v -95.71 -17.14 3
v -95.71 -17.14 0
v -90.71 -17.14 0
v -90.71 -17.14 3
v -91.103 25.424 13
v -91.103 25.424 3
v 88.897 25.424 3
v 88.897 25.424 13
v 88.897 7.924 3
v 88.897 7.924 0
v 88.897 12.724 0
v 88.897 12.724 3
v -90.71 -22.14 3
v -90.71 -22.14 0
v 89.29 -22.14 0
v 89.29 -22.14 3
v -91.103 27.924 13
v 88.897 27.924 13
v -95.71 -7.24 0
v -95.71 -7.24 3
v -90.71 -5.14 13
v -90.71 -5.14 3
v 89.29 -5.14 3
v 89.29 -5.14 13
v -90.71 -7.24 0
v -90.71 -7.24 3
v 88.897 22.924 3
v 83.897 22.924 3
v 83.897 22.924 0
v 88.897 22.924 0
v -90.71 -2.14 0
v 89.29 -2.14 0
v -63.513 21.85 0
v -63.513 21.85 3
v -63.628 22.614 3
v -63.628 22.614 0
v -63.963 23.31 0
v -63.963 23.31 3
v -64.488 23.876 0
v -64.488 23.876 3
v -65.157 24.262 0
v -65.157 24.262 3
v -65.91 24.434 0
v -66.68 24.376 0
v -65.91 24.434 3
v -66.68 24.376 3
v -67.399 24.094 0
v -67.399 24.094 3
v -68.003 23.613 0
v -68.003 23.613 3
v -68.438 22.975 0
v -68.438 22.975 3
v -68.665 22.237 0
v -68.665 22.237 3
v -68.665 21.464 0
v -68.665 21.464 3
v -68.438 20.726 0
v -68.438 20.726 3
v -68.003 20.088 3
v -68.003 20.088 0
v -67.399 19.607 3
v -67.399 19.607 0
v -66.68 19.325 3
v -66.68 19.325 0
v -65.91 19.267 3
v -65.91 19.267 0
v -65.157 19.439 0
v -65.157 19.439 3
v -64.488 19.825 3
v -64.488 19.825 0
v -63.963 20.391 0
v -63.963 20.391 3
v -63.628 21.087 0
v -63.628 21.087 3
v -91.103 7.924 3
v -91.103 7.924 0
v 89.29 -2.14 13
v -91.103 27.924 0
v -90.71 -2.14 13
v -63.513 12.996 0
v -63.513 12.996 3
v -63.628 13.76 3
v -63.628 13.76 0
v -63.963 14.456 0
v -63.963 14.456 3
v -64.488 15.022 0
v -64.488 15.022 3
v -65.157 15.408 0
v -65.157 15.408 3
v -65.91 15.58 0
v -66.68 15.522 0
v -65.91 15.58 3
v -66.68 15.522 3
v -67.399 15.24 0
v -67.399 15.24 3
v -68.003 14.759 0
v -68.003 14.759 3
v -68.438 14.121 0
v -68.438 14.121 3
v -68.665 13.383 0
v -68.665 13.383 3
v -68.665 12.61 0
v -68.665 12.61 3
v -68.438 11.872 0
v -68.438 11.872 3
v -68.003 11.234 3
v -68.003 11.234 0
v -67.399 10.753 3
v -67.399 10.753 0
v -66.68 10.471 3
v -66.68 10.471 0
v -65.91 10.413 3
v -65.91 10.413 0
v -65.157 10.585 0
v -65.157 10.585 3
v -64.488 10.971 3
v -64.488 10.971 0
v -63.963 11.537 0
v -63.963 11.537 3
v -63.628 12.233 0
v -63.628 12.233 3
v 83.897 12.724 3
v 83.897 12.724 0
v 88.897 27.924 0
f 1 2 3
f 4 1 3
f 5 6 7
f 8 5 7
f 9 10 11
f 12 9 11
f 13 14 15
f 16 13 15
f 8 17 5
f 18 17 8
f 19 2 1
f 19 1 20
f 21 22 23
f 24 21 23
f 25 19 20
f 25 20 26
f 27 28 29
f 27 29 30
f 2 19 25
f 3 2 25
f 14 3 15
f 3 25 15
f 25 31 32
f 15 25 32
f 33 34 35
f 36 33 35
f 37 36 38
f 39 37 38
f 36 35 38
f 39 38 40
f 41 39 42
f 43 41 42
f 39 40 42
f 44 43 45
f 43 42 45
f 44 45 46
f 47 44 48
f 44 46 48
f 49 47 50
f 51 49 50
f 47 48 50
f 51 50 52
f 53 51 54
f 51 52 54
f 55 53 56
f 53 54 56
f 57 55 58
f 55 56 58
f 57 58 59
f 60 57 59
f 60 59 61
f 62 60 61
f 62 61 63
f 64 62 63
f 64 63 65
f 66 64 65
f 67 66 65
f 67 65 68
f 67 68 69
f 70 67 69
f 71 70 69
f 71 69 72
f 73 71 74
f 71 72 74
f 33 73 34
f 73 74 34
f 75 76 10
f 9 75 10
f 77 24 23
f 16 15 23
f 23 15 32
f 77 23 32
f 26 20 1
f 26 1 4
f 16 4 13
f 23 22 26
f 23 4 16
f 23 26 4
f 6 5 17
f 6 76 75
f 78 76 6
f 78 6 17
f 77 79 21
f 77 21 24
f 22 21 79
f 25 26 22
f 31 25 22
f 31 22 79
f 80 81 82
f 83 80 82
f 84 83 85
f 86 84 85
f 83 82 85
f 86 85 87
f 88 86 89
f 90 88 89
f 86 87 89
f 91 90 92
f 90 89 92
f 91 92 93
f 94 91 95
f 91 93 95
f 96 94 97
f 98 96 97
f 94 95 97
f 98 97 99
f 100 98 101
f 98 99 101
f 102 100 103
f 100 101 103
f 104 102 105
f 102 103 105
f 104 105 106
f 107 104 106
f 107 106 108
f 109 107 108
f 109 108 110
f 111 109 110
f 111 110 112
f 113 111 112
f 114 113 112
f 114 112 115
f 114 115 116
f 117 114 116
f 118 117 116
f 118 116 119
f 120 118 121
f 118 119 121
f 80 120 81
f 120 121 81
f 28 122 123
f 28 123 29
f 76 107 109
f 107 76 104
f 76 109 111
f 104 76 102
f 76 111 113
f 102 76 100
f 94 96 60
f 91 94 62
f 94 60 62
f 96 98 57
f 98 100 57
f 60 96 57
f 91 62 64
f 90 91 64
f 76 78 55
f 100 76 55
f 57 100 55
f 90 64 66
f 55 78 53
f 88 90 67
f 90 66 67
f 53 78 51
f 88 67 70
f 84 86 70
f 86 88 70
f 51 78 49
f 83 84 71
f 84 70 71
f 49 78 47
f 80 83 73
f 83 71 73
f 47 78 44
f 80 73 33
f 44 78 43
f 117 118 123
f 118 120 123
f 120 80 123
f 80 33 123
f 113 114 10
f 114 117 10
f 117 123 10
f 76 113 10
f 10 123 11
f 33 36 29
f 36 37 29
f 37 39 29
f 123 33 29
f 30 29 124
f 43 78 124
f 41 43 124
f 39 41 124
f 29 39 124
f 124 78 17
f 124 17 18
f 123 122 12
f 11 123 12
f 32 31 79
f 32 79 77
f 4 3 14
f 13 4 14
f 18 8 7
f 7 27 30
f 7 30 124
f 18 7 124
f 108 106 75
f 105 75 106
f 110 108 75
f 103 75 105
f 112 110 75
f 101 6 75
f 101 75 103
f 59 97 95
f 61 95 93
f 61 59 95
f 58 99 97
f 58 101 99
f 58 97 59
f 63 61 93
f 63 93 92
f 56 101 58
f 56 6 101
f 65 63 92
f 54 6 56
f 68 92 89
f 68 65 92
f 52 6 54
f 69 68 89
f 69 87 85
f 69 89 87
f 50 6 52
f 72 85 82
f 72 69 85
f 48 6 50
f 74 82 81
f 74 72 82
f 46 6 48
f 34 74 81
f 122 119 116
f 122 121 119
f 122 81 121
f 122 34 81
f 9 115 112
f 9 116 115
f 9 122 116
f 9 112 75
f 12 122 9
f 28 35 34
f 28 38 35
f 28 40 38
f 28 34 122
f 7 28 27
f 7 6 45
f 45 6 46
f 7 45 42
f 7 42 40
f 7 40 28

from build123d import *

# Parameters (mm, degrees)
F0_W     = 180
F0_H     = 20
F0_W_2   = 5
F0_H_2   = 9.9
F1_DEPTH = 3
F2_W     = 5
F2_H     = 10.2
F3_DEPTH = 3
F4_W     = 180
F4_H     = 2.5
F5_DEPTH = 10
F6_W     = 180
F6_H     = 3
F7_DEPTH = 10
F8_R     = 2.590815
F9_DEPTH = 3


with BuildPart() as f1:
    # F0 (on Top) → F1 (new body)
    with BuildSketch(Plane.XY):
        with Locations((-1.103466, 17.924061)):
            Rectangle(F0_W, F0_H)
        Polygon((89.29022, -2.139678), (-90.70978, -2.139678), (-90.70978, -7.239678), (-90.70978, -17.139678), (-90.70978, -22.139678), (89.29022, -22.139678), align=None)
        with Locations((-93.20978, -12.189678)):
            Rectangle(F0_W_2, F0_H_2)
    extrude(amount=F1_DEPTH)

    # F2 (on face) → F3 (cut)
    with BuildSketch(Plane.XY.offset(3)):
        with Locations((86.396534, 17.824061)):
            Rectangle(F2_W, F2_H)
    extrude(amount=-F3_DEPTH, mode=Mode.SUBTRACT)

    # F4 (on face) → F5 (join)
    with BuildSketch(Plane.XY.offset(3)):
        with Locations((-1.103466, 26.674061)):
            Rectangle(F4_W, F4_H)
    extrude(amount=F5_DEPTH)

    # F6 (on face) → F7 (join)
    with BuildSketch(Plane.XY.offset(3)):
        with Locations((-0.70978, -3.639678)):
            Rectangle(F6_W, F6_H)
    extrude(amount=F7_DEPTH)

    # F8 (on face) → F9 (cut)
    with BuildSketch(Plane.XY.offset(3)):
        with Locations((-66.103466, 21.850408)):
            Circle(F8_R)
        with Locations((-66.103466, 12.99647)):
            Circle(F8_R)
    extrude(amount=-F9_DEPTH, mode=Mode.SUBTRACT)


solid = f1.part
